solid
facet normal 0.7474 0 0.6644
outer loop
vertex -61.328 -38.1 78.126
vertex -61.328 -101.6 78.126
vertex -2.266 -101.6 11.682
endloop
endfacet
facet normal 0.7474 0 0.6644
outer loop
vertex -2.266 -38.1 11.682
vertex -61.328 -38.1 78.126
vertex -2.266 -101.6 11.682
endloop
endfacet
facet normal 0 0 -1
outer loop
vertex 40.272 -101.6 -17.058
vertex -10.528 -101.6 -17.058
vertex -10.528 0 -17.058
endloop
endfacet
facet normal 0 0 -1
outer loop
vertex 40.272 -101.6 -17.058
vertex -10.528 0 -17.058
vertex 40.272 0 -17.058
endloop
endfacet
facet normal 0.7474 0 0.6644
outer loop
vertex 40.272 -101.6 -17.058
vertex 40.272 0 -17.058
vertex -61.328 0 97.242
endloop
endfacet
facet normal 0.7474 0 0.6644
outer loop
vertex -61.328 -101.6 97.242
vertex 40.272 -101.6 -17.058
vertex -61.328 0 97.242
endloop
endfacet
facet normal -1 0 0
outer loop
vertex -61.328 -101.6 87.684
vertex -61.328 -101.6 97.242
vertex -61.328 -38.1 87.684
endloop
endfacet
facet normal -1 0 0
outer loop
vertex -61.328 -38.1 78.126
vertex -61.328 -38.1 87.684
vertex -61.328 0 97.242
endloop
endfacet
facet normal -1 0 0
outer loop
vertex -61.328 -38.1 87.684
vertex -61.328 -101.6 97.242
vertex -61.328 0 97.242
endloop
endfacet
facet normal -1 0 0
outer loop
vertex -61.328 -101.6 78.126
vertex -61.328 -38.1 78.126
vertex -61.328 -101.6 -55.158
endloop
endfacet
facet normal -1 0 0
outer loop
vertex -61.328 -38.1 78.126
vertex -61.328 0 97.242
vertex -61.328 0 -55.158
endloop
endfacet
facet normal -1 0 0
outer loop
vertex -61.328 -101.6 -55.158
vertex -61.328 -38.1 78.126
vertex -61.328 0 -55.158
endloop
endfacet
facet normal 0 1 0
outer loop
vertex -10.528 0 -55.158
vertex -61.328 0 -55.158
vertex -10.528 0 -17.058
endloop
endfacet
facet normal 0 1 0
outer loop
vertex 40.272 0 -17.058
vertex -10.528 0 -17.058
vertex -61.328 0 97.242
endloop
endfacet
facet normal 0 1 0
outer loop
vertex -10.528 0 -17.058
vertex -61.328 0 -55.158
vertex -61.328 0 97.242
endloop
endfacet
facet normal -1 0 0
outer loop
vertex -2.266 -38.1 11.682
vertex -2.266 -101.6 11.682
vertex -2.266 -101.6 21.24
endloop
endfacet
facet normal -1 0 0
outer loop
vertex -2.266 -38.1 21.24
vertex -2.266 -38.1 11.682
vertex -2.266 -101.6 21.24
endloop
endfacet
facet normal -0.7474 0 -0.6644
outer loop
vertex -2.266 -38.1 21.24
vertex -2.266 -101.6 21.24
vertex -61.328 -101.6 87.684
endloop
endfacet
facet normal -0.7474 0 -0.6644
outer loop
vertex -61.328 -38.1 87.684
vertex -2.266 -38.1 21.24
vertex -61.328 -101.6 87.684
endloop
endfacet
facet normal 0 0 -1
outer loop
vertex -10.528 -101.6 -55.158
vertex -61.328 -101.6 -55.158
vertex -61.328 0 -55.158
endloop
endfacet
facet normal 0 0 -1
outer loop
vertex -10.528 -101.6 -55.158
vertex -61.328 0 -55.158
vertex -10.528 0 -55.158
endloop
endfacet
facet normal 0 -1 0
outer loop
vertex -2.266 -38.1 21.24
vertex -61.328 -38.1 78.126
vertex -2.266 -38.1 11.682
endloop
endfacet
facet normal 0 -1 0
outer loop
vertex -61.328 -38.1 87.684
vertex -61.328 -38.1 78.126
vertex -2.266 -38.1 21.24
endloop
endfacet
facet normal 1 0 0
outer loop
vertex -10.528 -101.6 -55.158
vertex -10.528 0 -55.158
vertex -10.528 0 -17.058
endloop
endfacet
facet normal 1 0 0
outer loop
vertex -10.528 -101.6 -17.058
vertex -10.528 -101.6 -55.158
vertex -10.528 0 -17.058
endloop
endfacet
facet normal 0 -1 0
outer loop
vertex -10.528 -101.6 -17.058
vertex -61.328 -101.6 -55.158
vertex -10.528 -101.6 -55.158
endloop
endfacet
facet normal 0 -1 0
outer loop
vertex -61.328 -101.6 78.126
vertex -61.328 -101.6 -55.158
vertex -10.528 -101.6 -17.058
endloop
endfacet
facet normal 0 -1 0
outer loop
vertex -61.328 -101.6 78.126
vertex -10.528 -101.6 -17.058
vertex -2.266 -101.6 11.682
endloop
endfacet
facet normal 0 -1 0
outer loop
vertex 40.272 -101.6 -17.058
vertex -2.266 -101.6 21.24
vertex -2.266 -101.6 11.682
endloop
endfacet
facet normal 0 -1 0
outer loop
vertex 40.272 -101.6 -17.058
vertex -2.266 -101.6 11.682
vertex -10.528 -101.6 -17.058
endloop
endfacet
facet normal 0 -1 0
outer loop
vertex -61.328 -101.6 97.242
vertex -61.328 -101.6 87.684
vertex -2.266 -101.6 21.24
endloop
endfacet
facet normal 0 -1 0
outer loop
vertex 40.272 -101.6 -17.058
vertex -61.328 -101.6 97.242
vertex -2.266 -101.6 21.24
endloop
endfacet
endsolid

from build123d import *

# Parameters (mm, degrees)
F1_DEPTH = 101.6
F3_DEPTH = 63.5


with BuildPart() as f1:
    # F0 (on Front) → F1 (new body)
    with BuildSketch(Plane.XZ):
        Polygon((-61.3276321992, 97.2424396313), (-61.3276321992, -55.1575603687), (-10.5276321992, -55.1575603687), (-10.5276321992, -17.0575603687), (40.2723678008, -17.0575603687), align=None)
    extrude(amount=F1_DEPTH)

    # F2 (on face) → F3 (cut)
    with BuildSketch(Plane.XZ.offset(101.6)):
        Polygon((-61.3276321992, 87.6844239344), (-61.3276321992, 78.1264082375), (-2.2656869272, 11.6817198065), (-2.2656869272, 21.2397355034), align=None)
    extrude(amount=-F3_DEPTH, mode=Mode.SUBTRACT)


solid = f1.part
